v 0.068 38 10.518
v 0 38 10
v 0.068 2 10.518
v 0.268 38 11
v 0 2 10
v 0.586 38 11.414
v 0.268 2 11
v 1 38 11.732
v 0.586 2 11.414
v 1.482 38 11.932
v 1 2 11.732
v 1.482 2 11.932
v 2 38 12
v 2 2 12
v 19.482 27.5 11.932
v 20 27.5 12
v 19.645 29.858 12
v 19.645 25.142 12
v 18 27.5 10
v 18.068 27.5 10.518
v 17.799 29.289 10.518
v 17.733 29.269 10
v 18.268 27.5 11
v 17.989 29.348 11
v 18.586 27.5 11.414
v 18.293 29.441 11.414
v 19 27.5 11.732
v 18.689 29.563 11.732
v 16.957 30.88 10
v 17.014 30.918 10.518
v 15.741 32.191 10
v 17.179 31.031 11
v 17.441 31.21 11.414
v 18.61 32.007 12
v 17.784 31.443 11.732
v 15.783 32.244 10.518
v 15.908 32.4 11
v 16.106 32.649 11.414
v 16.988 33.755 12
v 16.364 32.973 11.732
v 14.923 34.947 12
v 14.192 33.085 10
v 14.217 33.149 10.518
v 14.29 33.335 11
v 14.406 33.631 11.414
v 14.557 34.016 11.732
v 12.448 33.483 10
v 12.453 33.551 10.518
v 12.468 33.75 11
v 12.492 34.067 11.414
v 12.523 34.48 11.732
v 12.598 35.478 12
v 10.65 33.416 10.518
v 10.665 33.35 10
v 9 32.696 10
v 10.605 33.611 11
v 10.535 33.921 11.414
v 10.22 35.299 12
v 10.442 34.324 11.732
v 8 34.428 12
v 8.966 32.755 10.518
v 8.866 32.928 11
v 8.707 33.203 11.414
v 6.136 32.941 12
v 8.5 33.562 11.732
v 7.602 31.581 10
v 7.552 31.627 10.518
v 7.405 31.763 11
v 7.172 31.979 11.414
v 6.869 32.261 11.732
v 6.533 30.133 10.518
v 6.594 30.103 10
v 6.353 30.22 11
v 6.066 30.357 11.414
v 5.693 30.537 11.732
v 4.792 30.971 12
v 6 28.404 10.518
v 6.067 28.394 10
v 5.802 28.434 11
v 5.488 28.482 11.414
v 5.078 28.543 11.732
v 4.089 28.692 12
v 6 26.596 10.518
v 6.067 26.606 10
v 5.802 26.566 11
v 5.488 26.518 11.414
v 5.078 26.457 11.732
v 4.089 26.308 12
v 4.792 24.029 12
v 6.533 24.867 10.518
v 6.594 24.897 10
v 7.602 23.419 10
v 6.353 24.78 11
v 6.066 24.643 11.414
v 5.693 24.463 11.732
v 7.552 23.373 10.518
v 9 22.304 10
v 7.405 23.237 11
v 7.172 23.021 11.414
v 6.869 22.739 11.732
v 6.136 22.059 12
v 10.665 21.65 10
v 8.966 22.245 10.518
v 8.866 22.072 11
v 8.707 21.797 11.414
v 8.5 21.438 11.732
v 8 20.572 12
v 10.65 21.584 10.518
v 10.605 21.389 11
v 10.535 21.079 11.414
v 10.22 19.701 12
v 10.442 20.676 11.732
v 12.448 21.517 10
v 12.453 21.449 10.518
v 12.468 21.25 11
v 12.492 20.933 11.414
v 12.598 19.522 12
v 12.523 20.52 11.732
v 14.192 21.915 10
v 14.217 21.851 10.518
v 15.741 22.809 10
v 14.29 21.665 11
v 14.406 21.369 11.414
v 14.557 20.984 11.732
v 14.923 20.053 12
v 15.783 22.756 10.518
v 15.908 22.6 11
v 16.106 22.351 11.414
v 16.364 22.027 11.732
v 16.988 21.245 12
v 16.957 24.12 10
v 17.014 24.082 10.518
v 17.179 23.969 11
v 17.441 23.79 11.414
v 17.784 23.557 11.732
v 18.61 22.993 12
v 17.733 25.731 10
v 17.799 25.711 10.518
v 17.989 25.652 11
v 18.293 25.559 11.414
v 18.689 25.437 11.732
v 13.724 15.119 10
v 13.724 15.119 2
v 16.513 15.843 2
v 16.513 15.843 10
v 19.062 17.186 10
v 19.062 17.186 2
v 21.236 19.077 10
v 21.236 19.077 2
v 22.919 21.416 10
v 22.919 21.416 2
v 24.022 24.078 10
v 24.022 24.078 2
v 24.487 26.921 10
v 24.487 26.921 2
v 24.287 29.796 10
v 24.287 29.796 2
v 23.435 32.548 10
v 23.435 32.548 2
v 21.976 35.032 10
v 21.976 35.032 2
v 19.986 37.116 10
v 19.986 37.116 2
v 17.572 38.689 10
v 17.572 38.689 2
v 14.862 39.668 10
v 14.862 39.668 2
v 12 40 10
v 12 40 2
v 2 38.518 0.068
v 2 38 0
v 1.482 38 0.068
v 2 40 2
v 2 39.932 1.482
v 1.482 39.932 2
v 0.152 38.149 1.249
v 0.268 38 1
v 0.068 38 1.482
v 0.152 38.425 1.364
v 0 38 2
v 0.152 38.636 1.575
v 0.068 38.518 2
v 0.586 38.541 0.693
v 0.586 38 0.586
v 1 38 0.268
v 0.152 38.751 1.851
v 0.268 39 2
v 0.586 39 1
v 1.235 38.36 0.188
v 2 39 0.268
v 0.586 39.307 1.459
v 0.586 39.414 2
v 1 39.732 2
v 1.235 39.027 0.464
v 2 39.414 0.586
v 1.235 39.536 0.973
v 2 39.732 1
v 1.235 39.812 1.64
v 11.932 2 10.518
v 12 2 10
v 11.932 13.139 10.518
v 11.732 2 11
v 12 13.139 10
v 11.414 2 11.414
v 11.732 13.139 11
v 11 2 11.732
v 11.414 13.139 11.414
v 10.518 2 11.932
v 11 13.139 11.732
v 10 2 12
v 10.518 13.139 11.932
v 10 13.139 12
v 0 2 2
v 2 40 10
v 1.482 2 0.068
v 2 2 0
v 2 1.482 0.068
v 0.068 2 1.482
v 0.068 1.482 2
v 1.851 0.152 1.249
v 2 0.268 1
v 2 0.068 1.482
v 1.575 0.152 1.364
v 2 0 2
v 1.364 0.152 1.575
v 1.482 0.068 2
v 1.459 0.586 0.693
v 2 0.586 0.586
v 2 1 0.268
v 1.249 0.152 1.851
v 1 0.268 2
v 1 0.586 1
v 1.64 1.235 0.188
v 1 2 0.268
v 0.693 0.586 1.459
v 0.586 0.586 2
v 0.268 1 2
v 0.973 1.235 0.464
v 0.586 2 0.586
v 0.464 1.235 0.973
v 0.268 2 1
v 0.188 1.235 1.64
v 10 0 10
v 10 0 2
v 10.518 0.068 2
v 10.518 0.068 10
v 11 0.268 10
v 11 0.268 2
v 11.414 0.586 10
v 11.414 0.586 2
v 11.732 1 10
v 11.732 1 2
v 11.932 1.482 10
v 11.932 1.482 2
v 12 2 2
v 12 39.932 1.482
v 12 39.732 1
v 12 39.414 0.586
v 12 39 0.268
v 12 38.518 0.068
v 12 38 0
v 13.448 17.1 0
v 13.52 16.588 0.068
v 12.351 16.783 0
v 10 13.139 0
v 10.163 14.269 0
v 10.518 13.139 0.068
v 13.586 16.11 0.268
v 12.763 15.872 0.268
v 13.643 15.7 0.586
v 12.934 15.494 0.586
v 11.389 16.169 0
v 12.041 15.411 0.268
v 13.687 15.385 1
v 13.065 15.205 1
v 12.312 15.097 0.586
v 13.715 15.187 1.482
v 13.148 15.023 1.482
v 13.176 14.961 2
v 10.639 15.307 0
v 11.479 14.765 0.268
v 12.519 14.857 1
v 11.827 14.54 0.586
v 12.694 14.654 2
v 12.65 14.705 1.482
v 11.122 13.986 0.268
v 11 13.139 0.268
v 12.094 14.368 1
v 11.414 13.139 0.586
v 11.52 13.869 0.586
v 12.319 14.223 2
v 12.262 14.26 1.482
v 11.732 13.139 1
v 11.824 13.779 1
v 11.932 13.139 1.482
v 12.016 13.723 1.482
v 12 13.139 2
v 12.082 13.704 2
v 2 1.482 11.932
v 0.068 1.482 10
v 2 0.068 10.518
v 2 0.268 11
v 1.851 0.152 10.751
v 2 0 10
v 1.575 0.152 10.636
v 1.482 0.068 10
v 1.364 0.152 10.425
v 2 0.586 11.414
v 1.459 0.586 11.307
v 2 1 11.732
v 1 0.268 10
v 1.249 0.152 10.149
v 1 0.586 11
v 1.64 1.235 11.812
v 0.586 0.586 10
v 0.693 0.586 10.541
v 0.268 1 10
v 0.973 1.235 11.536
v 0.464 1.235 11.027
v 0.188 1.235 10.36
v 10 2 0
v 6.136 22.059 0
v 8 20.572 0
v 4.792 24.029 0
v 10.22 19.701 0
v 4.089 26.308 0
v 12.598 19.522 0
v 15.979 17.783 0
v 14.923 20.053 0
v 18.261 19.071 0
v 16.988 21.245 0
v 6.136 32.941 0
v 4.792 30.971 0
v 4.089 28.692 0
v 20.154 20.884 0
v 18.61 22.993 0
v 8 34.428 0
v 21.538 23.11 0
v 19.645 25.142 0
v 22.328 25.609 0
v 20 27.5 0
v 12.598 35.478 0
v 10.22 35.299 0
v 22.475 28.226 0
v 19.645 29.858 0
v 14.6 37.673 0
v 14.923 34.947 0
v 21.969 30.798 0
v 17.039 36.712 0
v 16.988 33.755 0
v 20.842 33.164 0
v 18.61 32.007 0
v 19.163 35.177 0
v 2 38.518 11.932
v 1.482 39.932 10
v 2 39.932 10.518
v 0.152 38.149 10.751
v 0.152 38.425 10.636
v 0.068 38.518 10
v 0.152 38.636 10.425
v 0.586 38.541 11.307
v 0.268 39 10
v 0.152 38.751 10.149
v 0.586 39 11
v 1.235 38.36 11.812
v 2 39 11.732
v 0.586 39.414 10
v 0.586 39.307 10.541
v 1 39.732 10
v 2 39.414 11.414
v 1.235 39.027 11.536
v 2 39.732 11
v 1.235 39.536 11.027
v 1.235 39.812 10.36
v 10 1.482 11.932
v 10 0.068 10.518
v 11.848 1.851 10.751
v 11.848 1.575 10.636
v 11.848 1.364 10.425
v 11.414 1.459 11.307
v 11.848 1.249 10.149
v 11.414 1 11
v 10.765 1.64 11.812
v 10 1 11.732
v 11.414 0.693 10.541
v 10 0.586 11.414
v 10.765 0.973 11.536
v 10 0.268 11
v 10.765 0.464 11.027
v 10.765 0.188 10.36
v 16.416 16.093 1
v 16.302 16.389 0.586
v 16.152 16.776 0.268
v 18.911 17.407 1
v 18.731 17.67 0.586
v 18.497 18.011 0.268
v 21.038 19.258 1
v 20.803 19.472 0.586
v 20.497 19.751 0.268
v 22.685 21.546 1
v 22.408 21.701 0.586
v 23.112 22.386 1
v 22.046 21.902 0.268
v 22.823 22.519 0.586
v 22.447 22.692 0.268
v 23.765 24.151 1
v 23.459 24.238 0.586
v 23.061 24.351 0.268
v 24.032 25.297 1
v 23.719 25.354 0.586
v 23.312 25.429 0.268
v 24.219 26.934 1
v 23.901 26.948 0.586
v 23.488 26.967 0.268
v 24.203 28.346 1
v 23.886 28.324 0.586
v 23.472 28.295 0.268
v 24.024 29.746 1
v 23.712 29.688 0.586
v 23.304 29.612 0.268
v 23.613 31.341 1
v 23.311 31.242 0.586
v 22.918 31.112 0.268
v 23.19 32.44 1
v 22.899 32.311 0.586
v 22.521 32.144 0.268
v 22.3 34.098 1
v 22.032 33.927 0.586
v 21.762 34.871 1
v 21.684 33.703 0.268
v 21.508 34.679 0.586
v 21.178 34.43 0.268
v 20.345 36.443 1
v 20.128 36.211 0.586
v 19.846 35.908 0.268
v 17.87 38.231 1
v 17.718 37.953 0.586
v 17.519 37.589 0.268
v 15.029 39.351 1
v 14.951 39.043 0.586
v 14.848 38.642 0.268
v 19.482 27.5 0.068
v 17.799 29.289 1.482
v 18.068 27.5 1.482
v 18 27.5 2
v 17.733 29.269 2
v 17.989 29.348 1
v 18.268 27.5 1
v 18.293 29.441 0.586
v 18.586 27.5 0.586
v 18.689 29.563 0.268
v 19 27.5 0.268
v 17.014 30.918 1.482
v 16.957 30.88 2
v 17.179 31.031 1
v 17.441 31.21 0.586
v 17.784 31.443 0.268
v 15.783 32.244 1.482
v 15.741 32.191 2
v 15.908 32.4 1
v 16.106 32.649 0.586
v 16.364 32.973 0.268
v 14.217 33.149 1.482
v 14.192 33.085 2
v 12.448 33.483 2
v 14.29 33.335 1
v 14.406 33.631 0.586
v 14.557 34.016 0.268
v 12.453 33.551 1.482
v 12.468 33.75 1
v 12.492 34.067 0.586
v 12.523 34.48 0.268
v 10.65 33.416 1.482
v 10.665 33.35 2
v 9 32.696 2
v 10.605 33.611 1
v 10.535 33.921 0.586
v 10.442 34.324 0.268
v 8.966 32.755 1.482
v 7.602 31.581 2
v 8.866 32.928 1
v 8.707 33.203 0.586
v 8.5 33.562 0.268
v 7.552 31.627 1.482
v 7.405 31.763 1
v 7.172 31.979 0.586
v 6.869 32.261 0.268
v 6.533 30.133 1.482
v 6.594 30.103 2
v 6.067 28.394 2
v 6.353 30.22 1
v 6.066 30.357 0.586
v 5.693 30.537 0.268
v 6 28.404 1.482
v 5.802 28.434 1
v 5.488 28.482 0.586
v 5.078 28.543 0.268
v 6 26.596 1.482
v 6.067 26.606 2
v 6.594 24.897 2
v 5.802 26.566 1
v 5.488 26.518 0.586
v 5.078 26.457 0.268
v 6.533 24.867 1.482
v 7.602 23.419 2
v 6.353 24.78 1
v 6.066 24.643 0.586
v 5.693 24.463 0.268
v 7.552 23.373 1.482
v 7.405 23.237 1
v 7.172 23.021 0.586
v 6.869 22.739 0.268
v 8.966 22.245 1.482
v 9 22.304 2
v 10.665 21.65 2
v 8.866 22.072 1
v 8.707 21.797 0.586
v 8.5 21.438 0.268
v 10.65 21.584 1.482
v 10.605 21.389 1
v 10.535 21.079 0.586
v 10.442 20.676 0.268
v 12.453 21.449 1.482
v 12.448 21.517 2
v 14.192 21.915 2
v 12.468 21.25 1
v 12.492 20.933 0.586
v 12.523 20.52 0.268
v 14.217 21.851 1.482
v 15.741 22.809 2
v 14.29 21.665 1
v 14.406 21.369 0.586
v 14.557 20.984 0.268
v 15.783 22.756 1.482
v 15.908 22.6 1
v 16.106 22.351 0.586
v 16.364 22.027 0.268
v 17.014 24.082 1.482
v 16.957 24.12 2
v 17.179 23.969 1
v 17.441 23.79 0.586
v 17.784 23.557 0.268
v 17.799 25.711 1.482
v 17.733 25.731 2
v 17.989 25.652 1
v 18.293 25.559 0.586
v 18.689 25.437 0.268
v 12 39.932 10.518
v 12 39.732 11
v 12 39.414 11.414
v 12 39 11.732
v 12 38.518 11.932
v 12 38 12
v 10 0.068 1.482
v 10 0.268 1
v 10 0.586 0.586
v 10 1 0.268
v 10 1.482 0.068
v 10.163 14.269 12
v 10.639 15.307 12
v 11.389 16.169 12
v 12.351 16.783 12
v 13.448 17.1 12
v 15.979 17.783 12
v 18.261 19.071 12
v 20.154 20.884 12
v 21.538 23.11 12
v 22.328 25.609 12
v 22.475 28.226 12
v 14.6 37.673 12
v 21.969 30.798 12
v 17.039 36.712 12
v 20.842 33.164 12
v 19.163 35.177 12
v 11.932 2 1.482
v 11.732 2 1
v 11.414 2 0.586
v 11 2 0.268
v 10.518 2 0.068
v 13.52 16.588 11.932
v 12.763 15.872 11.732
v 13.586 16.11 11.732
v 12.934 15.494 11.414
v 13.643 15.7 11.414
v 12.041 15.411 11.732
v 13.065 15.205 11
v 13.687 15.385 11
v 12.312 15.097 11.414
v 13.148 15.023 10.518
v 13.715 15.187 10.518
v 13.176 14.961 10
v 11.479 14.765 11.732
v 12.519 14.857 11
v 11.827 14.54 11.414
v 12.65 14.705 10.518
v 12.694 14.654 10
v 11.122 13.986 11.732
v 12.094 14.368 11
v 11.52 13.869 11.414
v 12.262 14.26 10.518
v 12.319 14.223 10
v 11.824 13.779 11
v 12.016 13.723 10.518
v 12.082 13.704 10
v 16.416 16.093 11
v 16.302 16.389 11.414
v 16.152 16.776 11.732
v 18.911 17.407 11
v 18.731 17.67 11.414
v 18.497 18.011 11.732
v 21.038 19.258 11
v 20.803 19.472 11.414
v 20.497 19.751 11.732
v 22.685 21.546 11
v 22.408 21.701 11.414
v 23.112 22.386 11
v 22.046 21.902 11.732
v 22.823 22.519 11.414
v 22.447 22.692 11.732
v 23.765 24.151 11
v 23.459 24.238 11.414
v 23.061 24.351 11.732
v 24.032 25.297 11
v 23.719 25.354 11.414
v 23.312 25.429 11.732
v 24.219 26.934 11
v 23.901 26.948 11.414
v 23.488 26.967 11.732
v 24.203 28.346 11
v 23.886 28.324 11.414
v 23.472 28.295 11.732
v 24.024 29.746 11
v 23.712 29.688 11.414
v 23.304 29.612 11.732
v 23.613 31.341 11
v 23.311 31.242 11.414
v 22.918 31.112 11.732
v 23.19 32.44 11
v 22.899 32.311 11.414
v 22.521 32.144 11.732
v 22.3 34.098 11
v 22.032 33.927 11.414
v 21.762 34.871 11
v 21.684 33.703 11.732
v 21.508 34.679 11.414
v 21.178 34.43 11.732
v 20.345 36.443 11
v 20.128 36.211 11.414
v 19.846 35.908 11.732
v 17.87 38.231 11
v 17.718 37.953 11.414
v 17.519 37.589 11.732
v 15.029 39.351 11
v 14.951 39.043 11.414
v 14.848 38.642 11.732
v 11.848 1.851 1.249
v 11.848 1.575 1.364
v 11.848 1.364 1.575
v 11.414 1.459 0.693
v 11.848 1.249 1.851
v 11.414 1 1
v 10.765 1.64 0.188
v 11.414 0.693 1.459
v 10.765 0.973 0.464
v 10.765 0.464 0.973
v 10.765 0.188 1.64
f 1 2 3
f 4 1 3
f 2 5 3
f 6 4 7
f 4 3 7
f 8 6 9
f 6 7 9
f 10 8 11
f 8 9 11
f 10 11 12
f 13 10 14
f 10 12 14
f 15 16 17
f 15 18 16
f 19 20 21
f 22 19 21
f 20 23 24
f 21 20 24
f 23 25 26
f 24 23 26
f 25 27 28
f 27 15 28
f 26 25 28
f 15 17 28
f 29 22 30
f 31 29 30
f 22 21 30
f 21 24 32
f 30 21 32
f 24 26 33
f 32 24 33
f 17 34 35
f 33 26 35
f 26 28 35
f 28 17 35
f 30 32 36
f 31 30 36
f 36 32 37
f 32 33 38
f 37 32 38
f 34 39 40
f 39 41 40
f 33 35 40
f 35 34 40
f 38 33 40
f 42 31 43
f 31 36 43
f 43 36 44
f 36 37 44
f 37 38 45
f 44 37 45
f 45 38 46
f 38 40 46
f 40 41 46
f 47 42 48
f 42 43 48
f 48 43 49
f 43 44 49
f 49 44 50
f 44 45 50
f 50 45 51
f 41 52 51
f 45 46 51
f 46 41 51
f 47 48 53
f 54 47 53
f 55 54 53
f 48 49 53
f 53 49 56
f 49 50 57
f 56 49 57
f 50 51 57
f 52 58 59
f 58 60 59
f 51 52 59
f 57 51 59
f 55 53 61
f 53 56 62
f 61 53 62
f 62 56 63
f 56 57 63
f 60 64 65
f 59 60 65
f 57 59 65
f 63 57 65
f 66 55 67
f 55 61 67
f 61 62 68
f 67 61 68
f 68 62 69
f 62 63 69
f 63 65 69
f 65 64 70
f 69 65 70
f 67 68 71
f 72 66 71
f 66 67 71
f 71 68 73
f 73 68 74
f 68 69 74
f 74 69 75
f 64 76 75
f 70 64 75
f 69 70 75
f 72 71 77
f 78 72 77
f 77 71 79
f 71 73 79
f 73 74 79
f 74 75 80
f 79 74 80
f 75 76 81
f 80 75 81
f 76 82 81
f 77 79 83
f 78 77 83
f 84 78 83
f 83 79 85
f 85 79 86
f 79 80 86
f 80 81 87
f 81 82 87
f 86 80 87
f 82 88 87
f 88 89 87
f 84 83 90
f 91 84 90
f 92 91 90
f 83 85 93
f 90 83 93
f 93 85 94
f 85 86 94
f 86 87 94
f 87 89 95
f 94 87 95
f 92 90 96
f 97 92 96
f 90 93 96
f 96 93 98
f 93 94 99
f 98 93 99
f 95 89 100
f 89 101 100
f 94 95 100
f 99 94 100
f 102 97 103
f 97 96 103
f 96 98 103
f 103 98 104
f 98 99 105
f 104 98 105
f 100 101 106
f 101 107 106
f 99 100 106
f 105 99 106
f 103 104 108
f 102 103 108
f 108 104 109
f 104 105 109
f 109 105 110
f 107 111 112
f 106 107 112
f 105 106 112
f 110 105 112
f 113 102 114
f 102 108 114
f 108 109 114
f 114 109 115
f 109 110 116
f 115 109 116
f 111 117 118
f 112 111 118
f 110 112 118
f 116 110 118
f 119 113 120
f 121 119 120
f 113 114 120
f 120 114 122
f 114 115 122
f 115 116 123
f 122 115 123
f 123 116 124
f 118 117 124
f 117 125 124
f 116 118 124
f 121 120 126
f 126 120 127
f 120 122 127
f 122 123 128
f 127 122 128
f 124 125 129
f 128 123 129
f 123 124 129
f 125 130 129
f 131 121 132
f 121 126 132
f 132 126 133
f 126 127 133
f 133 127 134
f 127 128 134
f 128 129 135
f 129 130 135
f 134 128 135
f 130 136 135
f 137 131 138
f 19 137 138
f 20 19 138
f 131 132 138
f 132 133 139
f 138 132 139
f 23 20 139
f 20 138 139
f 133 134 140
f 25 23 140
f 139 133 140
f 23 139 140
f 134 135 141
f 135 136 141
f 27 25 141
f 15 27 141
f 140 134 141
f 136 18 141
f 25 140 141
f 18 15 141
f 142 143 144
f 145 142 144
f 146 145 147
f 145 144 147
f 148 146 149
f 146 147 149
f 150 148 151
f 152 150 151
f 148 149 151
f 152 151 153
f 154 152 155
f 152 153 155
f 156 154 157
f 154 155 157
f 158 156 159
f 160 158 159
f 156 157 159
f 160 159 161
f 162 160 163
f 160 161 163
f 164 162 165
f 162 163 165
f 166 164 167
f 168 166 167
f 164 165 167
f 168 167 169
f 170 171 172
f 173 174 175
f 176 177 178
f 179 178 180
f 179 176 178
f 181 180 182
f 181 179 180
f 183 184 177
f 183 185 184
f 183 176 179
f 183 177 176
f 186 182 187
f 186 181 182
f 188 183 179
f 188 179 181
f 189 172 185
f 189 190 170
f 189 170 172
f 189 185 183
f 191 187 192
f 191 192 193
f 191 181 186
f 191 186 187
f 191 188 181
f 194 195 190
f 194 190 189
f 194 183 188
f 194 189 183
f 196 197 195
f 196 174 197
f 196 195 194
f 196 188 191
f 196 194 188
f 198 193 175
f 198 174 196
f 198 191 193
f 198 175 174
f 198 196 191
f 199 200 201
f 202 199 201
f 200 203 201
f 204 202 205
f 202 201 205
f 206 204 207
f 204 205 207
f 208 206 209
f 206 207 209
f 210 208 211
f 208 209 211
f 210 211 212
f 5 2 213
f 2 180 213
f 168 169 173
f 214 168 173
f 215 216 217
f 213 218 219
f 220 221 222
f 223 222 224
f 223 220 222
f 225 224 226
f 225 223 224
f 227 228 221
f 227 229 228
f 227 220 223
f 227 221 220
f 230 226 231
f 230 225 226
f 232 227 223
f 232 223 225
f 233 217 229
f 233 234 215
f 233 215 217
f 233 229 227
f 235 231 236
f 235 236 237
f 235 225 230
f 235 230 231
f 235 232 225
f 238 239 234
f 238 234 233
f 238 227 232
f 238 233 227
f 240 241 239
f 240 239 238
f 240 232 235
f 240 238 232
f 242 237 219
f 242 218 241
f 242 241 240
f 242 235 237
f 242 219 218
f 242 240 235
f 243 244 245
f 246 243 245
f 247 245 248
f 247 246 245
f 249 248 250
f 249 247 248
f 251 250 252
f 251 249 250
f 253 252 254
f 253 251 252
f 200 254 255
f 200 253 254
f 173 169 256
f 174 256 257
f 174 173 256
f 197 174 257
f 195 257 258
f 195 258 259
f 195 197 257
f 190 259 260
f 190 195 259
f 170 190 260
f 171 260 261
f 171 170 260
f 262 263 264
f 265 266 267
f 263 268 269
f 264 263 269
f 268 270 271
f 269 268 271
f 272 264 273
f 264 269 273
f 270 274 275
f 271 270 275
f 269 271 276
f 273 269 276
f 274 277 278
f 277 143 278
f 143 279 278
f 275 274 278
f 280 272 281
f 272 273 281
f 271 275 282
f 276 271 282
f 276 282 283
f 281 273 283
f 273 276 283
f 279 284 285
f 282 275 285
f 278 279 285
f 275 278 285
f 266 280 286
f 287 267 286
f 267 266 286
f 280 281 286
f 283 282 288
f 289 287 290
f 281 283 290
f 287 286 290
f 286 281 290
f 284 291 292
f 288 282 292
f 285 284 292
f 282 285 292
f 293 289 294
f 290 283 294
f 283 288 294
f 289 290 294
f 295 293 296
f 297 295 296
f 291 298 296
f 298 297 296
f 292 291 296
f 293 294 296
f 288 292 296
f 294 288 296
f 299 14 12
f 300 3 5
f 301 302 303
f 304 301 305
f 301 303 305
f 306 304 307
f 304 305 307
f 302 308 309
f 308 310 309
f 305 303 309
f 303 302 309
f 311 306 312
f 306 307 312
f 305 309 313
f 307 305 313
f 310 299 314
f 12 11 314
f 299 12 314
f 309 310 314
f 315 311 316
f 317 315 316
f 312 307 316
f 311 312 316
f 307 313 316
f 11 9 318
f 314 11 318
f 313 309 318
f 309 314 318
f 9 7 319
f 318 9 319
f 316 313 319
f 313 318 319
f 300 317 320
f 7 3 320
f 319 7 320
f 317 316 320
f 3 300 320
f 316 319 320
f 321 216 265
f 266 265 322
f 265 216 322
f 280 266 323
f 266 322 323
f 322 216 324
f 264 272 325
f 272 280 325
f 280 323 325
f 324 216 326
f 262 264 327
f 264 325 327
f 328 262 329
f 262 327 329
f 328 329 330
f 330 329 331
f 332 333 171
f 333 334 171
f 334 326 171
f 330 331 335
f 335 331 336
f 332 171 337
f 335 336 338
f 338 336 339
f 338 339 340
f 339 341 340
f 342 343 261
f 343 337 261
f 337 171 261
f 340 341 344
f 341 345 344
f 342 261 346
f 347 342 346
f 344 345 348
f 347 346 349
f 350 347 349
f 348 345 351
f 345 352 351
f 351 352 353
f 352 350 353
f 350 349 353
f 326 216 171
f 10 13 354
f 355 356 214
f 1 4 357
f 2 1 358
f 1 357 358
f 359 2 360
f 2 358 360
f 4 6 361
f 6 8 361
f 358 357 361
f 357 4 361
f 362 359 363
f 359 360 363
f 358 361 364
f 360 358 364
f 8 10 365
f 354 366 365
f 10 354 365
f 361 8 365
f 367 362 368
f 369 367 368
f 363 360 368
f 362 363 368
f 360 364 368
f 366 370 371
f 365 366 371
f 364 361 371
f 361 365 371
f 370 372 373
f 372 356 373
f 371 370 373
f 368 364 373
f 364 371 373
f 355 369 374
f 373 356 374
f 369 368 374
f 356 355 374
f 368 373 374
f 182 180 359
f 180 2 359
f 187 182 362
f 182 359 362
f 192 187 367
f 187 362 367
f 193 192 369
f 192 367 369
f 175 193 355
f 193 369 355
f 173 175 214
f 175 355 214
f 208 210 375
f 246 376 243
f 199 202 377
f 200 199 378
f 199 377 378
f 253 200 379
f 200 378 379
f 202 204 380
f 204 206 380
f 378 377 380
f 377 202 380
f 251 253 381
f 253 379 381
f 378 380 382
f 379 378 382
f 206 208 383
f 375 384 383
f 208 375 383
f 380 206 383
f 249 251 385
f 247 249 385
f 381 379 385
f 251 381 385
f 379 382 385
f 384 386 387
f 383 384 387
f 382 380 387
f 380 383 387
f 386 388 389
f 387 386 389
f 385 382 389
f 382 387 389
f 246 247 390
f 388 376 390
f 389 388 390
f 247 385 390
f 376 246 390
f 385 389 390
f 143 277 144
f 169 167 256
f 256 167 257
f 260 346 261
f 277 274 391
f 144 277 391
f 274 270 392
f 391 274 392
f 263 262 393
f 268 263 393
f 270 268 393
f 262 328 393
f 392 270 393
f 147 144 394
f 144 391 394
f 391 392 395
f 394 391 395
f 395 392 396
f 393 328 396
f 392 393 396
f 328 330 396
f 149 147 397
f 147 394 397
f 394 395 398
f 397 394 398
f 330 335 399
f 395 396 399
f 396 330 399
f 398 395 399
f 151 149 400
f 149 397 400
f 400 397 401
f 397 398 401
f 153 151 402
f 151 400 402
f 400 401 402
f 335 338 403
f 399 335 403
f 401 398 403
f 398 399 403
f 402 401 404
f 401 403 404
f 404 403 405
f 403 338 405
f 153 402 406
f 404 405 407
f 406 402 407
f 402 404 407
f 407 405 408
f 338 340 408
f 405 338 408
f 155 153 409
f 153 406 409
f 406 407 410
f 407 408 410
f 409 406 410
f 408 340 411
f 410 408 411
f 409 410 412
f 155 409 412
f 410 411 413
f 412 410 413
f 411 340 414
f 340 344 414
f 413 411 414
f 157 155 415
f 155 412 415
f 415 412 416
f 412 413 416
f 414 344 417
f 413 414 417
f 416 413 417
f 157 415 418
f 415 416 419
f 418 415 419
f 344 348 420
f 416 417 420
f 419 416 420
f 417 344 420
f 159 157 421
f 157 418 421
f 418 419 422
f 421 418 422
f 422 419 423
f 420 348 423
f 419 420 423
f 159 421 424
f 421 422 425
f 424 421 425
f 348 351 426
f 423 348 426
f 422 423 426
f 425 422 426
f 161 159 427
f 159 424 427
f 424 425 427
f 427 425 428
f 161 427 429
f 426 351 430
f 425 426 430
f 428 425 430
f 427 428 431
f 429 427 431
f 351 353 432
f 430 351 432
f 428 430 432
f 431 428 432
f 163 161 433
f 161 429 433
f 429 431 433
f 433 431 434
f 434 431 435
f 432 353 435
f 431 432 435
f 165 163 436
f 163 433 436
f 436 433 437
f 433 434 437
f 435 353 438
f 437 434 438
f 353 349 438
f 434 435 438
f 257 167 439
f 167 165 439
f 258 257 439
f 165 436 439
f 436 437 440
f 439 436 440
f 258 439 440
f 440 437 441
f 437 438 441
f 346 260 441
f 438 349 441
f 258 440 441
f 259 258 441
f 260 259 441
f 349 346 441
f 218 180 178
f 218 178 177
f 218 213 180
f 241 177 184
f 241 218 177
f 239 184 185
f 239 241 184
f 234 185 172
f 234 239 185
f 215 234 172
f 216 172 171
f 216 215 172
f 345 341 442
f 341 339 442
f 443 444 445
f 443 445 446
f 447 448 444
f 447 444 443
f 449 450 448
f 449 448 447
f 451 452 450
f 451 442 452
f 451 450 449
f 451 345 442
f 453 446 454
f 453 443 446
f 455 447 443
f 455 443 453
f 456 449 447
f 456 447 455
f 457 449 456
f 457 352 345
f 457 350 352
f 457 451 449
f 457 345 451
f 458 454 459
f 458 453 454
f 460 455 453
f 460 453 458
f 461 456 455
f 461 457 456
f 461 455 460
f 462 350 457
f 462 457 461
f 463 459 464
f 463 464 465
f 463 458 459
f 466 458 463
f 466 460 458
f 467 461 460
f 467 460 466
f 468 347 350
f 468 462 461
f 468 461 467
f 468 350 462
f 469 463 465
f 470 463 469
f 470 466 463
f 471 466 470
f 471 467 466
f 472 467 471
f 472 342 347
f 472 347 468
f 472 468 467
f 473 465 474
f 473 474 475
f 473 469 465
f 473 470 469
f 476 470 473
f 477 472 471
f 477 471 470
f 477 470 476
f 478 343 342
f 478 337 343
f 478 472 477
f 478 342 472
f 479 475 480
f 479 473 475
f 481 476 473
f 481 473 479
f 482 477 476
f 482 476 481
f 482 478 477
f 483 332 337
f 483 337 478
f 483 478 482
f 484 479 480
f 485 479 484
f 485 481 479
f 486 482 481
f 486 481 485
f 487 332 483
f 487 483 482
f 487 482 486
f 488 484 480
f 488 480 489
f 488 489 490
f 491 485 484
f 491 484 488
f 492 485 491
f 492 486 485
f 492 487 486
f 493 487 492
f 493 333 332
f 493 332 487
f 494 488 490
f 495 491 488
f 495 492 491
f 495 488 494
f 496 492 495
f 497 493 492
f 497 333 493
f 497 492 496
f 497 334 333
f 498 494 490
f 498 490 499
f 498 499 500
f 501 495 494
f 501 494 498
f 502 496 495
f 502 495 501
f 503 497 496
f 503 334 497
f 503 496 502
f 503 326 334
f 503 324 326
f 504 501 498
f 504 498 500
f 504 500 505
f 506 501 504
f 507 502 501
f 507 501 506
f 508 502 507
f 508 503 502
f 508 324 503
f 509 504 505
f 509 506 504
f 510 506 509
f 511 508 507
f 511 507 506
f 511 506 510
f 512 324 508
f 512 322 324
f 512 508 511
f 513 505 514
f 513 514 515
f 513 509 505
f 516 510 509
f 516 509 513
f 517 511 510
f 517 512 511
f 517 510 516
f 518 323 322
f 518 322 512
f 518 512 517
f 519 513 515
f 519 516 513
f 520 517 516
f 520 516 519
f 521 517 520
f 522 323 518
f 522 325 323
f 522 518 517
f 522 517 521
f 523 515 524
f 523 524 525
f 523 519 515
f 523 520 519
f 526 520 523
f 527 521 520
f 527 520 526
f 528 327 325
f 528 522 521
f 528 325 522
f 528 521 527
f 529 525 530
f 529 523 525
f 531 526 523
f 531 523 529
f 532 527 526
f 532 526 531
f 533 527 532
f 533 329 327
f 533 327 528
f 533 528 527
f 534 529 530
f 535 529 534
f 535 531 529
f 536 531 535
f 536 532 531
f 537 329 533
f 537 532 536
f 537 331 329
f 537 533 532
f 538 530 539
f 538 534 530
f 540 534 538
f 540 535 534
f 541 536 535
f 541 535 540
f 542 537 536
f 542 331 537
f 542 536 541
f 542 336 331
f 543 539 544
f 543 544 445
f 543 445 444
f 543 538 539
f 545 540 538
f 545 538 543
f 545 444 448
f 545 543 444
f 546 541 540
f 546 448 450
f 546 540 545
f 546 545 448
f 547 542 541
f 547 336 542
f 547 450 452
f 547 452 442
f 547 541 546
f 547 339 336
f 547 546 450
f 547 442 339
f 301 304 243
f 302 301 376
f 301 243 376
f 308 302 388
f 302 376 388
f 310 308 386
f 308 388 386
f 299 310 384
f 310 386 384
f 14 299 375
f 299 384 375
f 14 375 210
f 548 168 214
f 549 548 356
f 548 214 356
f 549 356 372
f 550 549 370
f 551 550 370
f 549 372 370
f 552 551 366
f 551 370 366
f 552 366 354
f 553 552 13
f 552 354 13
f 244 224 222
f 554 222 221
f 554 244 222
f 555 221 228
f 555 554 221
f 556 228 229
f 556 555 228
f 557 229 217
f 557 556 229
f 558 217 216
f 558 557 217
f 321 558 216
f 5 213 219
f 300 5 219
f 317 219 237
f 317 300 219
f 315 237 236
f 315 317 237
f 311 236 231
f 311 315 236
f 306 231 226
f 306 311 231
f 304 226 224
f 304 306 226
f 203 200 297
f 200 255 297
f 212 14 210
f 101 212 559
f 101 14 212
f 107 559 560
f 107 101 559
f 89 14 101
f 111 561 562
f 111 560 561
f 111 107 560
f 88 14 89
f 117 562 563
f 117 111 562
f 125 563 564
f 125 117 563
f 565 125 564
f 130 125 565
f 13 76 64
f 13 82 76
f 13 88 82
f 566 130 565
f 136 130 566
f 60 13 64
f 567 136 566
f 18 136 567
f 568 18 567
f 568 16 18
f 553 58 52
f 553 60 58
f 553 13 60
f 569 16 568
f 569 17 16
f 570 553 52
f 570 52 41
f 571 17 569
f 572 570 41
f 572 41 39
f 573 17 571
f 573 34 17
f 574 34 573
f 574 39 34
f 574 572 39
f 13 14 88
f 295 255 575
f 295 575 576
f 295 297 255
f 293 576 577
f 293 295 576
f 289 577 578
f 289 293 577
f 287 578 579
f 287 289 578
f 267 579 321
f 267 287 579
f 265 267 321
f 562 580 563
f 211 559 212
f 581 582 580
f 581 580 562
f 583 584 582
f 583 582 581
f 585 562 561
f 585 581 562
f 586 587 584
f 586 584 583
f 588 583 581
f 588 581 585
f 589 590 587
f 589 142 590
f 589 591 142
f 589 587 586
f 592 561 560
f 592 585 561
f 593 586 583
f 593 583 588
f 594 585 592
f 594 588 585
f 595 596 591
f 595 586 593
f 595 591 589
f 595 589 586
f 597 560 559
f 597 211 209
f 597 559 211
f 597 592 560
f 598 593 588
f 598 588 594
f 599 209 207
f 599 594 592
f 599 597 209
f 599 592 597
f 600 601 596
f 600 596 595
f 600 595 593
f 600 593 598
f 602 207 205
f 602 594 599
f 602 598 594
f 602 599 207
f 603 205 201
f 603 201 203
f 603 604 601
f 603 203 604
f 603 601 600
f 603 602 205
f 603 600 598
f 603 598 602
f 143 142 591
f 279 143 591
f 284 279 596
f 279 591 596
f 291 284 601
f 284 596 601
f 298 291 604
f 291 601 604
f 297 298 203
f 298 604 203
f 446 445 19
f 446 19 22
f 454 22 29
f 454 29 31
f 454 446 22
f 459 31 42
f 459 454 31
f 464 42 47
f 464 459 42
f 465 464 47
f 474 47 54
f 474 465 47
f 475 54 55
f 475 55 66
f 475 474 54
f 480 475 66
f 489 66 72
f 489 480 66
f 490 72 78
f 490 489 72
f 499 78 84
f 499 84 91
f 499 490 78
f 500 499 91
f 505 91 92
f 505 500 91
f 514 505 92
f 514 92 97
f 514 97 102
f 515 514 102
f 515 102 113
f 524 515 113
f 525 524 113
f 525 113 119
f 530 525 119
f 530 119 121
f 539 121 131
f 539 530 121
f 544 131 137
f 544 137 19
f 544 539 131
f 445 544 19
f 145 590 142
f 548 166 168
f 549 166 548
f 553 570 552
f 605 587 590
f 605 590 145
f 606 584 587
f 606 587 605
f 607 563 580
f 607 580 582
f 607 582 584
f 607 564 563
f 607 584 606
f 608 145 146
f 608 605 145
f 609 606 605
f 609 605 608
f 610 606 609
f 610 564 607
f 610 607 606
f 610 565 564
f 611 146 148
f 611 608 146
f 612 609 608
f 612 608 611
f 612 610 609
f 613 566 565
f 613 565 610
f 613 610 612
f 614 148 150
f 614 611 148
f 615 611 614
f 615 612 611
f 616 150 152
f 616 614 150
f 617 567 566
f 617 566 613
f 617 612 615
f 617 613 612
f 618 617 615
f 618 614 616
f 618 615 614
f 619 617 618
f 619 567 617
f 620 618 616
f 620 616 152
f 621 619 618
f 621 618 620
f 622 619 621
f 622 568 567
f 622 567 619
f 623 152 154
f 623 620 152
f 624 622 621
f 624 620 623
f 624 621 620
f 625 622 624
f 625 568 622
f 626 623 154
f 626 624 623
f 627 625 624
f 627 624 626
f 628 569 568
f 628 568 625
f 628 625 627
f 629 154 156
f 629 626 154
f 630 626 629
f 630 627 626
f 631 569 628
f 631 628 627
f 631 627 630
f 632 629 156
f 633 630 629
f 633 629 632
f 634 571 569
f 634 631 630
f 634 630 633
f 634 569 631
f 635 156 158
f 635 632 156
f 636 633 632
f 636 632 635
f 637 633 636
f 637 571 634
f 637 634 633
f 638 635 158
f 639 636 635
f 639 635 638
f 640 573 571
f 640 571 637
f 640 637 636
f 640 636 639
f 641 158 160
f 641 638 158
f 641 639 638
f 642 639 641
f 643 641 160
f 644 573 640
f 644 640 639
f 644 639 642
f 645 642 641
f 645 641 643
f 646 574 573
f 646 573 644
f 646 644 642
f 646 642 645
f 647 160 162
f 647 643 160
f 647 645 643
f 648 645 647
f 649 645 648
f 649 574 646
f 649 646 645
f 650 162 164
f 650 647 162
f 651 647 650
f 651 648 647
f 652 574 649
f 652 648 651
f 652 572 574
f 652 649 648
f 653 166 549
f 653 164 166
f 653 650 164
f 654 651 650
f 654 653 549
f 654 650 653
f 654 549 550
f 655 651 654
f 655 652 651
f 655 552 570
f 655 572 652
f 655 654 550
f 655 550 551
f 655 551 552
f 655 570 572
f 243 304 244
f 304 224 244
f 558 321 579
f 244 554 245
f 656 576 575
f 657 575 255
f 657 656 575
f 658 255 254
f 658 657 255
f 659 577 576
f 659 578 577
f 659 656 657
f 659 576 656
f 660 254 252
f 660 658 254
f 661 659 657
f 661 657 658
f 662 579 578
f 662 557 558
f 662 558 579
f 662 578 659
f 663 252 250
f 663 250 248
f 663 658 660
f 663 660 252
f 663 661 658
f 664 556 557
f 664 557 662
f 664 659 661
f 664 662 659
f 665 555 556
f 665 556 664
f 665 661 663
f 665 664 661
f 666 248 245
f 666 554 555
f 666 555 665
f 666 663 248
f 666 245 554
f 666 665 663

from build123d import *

# Parameters (mm, degrees)
F0_R     = 6
F1_DEPTH = 12
F2_R     = 2


with BuildPart() as f1:
    # F0 (on Top) → F1 (new body)
    with BuildSketch(Plane.XY):
        with BuildLine():
            Line((0, 40), (0, 0))
            Line((0, 0), (12, 0))
            Line((12, 0), (12, 15))
            ThreePointArc((12, 15), (24.5, 27.5), (12, 40))
            Line((12, 40), (0, 40))
        make_face()
        with Locations((12, 27.5)):
            Circle(F0_R, mode=Mode.SUBTRACT)
    extrude(amount=F1_DEPTH)

    # F2
    f2_edges = [f1.edges().sort_by_distance(p)[0] for p in [
        (6, 40, 12),
        (0, 20, 12),
        (6, 0, 12),
        (12, 7.5, 12),
        (24.5, 27.5, 12),
        (6, 27.5, 12),
        (6, 40, 0),
        (0, 20, 0),
        (6, 0, 0),
        (12, 7.5, 0),
        (24.5, 27.5, 0),
        (6, 27.5, 0),
        (0, 40, 6),
        (0, 0, 6),
        (12, 0, 6),
        (12, 15, 6),
    ]]
    fillet(f2_edges, radius=F2_R)


solid = f1.part
